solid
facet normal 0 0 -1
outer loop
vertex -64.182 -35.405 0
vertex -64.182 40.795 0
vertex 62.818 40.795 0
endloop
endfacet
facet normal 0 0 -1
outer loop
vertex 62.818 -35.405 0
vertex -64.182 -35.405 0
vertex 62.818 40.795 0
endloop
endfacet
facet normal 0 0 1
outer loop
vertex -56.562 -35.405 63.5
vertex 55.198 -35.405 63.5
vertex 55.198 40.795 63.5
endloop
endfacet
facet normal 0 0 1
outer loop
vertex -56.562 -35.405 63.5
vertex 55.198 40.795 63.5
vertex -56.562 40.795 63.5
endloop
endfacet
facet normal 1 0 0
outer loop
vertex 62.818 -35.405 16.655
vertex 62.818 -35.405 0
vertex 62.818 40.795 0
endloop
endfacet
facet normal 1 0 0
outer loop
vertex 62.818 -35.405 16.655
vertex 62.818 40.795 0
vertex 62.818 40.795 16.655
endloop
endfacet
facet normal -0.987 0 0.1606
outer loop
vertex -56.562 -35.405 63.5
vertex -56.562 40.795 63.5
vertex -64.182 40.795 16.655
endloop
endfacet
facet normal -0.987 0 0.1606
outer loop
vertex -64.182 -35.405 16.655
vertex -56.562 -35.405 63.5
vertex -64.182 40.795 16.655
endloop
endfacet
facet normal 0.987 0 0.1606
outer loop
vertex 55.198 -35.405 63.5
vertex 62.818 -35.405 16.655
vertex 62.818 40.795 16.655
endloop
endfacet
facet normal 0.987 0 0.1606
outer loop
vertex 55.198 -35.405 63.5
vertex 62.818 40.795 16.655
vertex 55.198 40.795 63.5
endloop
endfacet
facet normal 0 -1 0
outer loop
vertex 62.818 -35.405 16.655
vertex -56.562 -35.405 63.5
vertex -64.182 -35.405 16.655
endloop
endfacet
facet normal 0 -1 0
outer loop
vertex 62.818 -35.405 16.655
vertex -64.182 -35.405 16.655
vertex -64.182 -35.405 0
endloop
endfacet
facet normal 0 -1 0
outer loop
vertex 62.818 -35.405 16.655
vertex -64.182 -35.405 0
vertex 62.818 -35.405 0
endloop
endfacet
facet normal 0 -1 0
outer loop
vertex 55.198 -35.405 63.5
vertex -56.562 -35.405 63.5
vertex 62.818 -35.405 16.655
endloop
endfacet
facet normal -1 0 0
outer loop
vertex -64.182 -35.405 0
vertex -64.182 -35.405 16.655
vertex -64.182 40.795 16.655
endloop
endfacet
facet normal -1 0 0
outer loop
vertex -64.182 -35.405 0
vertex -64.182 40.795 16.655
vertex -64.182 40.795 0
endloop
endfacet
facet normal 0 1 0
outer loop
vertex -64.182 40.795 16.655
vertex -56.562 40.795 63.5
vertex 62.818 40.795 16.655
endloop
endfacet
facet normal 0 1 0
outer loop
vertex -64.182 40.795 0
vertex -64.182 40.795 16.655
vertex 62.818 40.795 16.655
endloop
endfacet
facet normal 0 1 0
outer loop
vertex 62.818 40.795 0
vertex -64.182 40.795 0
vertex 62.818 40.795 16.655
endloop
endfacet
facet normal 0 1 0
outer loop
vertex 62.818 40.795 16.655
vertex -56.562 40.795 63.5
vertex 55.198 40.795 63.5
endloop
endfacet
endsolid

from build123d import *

# Parameters (mm, degrees)
F0_W     = 127
F0_H     = 76.2
F1_DEPTH = 0.762
F3_DEPTH = 76.2


with BuildPart() as f1:
    # F0 (on Top) → F1 (new body)
    with BuildSketch(Plane.XY):
        with Locations((-0.68152, 2.694871)):
            Rectangle(F0_W, F0_H)
    extrude(amount=F1_DEPTH)

    # F2 (on face) → F3 (join)
    with BuildSketch(Plane.XZ.offset(35.405129)):
        Polygon((-64.18152, 0.762), (62.81848, 0.762), (62.81848, 16.655238), (55.19848, 63.5), (-56.56152, 63.5), (-64.18152, 16.655238), align=None)
    extrude(amount=-F3_DEPTH)


solid = f1.part
